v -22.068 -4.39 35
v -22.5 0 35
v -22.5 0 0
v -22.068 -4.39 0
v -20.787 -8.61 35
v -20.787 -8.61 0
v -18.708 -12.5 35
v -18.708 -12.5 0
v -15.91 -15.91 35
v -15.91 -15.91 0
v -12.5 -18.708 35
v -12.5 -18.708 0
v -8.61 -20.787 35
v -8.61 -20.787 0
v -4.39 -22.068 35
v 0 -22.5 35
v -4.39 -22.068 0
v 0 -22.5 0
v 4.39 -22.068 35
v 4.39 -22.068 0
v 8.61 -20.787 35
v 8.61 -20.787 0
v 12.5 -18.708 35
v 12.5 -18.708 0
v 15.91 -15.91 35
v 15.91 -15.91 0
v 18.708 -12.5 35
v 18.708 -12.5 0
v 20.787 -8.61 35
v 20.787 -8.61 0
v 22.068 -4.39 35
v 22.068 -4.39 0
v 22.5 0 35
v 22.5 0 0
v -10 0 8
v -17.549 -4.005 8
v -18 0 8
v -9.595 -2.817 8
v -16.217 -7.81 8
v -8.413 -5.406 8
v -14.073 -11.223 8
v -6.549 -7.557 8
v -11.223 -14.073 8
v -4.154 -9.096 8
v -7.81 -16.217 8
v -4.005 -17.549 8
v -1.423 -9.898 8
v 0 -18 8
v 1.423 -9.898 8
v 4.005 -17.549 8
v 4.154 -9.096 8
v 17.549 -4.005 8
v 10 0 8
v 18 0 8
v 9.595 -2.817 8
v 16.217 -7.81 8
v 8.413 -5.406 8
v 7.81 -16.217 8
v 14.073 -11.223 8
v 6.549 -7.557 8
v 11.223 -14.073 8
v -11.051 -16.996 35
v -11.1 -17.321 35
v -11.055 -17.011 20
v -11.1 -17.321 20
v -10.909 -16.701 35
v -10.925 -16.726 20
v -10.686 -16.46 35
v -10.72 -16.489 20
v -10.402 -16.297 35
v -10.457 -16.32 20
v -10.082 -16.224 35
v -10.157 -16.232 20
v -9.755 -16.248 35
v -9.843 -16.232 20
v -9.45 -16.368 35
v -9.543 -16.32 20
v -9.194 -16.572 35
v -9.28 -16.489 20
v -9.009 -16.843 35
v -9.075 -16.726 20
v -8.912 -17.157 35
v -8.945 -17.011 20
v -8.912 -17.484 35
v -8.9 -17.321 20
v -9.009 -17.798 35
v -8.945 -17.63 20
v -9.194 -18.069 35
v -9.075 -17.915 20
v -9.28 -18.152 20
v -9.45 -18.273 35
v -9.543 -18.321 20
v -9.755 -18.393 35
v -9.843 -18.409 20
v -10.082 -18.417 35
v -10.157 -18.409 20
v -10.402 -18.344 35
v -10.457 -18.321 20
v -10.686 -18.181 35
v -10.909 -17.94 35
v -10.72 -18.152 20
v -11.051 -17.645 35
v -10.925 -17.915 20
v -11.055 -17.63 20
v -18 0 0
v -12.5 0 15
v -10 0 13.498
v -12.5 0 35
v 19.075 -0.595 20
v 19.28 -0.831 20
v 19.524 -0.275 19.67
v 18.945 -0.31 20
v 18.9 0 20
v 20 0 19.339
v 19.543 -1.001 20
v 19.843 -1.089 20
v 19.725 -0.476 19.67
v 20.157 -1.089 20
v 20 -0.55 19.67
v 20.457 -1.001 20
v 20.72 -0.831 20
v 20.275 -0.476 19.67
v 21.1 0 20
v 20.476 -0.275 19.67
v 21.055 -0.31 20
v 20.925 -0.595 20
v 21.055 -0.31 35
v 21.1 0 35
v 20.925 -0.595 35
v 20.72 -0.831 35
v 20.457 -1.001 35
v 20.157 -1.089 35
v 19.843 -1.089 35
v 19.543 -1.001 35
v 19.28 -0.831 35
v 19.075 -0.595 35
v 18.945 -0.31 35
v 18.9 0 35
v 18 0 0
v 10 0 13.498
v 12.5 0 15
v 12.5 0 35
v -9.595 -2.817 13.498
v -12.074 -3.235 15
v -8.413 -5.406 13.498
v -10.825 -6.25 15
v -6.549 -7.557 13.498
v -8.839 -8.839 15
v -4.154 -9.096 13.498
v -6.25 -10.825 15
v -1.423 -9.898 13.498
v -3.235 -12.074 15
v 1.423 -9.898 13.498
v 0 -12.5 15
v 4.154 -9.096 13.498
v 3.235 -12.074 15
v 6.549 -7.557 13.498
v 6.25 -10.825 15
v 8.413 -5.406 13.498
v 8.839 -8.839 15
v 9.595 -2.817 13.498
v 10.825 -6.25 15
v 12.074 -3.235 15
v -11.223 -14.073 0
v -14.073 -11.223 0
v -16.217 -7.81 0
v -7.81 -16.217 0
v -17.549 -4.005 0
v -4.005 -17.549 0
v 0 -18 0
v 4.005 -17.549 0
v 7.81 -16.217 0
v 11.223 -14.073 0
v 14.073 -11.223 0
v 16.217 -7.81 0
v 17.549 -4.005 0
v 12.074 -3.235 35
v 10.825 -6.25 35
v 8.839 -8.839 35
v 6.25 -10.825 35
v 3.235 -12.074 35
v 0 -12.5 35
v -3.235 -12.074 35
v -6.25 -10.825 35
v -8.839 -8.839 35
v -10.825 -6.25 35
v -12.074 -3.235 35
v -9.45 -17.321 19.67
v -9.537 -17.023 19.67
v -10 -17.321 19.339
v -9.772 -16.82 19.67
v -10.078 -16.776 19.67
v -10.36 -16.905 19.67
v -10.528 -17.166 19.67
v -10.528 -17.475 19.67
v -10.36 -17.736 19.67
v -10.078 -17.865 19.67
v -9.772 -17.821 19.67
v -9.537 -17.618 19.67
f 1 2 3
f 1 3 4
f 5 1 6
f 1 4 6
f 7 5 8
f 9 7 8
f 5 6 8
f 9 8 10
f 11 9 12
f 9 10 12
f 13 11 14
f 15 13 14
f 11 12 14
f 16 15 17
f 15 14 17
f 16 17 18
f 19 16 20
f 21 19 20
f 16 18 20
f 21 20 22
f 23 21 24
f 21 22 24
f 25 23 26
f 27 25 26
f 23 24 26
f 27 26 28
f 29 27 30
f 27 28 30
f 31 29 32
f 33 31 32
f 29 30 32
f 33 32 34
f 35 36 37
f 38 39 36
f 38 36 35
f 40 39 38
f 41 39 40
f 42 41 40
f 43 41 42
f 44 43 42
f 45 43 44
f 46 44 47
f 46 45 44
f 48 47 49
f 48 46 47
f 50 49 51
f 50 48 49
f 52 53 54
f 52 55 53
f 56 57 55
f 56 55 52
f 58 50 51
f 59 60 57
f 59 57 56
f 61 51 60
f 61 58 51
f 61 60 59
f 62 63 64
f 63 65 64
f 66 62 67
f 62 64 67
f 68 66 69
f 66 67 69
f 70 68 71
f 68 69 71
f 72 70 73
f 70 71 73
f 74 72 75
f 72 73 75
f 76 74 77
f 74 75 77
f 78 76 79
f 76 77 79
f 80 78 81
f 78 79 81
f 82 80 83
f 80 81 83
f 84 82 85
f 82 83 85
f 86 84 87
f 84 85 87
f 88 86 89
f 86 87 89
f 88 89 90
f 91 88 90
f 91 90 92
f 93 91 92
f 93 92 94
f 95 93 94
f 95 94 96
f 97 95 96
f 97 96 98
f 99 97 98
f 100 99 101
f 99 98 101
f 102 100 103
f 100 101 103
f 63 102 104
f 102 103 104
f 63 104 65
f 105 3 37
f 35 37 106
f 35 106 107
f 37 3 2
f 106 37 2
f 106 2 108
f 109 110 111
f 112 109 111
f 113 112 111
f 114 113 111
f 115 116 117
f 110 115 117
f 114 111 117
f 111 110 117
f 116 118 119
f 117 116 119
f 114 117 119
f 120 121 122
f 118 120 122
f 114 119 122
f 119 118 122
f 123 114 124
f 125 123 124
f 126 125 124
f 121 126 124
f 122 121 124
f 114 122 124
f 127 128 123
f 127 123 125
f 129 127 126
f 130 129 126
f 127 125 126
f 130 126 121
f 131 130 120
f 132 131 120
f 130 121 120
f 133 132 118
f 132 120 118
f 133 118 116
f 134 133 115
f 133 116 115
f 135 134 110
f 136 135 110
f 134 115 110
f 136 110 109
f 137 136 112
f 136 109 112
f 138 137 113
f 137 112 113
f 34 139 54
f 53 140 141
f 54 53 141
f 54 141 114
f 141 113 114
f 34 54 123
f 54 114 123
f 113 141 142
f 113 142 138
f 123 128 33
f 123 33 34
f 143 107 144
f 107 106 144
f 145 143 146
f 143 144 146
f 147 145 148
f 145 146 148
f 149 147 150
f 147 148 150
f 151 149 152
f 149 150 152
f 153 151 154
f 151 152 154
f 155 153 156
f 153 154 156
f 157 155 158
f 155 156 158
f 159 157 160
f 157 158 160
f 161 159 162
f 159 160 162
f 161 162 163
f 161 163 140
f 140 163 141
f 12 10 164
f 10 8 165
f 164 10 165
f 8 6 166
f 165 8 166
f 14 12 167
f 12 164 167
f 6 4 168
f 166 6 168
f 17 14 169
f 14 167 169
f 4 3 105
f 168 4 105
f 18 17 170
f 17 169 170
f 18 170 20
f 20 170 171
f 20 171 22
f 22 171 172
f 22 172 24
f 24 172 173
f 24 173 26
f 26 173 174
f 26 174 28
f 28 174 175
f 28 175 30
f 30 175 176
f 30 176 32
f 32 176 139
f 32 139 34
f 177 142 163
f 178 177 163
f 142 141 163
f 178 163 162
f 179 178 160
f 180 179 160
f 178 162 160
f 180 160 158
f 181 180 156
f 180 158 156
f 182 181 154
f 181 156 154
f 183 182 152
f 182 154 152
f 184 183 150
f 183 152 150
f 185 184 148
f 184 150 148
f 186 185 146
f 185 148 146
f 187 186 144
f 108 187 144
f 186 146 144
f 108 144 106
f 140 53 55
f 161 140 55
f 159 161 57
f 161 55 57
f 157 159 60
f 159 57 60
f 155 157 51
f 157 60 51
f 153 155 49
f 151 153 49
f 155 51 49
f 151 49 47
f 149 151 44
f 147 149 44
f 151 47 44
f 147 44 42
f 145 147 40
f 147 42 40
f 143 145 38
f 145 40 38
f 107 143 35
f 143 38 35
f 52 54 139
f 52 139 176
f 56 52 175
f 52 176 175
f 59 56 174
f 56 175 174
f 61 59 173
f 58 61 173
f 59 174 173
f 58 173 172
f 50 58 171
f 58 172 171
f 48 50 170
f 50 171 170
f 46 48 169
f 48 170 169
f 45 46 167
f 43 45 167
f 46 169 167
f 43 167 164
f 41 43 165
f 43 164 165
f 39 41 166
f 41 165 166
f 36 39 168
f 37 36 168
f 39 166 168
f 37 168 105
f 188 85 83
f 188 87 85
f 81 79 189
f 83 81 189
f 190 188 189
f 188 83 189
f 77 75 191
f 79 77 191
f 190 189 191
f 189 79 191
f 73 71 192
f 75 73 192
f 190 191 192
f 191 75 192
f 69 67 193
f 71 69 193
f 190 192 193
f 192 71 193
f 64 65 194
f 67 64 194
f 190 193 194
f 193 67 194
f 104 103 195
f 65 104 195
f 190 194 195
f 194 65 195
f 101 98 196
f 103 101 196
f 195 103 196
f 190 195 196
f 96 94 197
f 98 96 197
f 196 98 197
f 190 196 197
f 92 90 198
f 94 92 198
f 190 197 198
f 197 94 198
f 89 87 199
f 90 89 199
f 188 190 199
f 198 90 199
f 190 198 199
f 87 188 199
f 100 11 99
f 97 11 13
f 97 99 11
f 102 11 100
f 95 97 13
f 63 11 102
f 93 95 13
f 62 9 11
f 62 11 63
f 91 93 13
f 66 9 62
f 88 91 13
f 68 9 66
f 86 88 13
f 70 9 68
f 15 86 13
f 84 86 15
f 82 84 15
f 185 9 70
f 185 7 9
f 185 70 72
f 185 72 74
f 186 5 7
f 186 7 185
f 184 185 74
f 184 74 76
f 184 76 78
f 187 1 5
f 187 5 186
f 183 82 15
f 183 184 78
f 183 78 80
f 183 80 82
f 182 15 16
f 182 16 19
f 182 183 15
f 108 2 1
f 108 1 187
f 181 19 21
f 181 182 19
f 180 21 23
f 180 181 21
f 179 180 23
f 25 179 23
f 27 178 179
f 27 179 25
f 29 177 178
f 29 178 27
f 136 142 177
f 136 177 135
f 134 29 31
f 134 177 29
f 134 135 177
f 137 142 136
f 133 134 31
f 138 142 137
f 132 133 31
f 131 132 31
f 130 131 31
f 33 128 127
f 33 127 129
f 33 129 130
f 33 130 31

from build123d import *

# Parameters (mm, degrees)
F0_R      = 22.5
F1_DEPTH  = 35
F2_R      = 18
F3_DEPTH  = 8
F5_D      = 25
F5_DEPTH  = 20
F5_TIP    = 7.5107577378
F6_D      = 20
F8_D      = 2.2
F8_DEPTH  = 15
F8_TIP    = 0.6609466809
F9_W      = 60.0066725165
F9_H      = 50.9474342689
F10_DEPTH = 25


with BuildPart() as f1:
    # F0 (on Top) → F1 (new body)
    with BuildSketch(Plane.XY):
        Circle(F0_R)
    extrude(amount=F1_DEPTH)

    # F2 (on face) → F3 (cut)
    with BuildSketch(Plane(origin=(0, 0, 0), x_dir=(1, 0, 0), z_dir=(0, 0, -1))):
        Circle(F2_R)
    extrude(amount=-F3_DEPTH, mode=Mode.SUBTRACT)

    # F5
    with Locations(Plane.XY.offset(35)):
        with Locations((0, 0)):
            Hole(F5_D / 2, depth=F5_DEPTH)
            with Locations((0, 0, -(F5_DEPTH + F5_TIP / 2))):  # 118° drill point
                Cone(0, F5_D / 2, F5_TIP, mode=Mode.SUBTRACT)

    # F6 (through all)
    with Locations(Plane.XY.offset(35)):
        with Locations((0, 0)):
            Hole(F6_D / 2)

    # F8
    with Locations(Plane.XY.offset(35)):
        with Locations((20, 0), (-10, 17.3205080757), (-10, -17.3205080757)):
            Hole(F8_D / 2, depth=F8_DEPTH)
            with Locations((0, 0, -(F8_DEPTH + F8_TIP / 2))):  # 118° drill point
                Cone(0, F8_D / 2, F8_TIP, mode=Mode.SUBTRACT)

    # F9 (on Front) → F10 (cut)
    with BuildSketch(Plane.XZ):
        with Locations((-0.6993999705, 19.8549819179)):
            Rectangle(F9_W, F9_H)
    extrude(amount=-F10_DEPTH, mode=Mode.SUBTRACT)


solid = f1.part
